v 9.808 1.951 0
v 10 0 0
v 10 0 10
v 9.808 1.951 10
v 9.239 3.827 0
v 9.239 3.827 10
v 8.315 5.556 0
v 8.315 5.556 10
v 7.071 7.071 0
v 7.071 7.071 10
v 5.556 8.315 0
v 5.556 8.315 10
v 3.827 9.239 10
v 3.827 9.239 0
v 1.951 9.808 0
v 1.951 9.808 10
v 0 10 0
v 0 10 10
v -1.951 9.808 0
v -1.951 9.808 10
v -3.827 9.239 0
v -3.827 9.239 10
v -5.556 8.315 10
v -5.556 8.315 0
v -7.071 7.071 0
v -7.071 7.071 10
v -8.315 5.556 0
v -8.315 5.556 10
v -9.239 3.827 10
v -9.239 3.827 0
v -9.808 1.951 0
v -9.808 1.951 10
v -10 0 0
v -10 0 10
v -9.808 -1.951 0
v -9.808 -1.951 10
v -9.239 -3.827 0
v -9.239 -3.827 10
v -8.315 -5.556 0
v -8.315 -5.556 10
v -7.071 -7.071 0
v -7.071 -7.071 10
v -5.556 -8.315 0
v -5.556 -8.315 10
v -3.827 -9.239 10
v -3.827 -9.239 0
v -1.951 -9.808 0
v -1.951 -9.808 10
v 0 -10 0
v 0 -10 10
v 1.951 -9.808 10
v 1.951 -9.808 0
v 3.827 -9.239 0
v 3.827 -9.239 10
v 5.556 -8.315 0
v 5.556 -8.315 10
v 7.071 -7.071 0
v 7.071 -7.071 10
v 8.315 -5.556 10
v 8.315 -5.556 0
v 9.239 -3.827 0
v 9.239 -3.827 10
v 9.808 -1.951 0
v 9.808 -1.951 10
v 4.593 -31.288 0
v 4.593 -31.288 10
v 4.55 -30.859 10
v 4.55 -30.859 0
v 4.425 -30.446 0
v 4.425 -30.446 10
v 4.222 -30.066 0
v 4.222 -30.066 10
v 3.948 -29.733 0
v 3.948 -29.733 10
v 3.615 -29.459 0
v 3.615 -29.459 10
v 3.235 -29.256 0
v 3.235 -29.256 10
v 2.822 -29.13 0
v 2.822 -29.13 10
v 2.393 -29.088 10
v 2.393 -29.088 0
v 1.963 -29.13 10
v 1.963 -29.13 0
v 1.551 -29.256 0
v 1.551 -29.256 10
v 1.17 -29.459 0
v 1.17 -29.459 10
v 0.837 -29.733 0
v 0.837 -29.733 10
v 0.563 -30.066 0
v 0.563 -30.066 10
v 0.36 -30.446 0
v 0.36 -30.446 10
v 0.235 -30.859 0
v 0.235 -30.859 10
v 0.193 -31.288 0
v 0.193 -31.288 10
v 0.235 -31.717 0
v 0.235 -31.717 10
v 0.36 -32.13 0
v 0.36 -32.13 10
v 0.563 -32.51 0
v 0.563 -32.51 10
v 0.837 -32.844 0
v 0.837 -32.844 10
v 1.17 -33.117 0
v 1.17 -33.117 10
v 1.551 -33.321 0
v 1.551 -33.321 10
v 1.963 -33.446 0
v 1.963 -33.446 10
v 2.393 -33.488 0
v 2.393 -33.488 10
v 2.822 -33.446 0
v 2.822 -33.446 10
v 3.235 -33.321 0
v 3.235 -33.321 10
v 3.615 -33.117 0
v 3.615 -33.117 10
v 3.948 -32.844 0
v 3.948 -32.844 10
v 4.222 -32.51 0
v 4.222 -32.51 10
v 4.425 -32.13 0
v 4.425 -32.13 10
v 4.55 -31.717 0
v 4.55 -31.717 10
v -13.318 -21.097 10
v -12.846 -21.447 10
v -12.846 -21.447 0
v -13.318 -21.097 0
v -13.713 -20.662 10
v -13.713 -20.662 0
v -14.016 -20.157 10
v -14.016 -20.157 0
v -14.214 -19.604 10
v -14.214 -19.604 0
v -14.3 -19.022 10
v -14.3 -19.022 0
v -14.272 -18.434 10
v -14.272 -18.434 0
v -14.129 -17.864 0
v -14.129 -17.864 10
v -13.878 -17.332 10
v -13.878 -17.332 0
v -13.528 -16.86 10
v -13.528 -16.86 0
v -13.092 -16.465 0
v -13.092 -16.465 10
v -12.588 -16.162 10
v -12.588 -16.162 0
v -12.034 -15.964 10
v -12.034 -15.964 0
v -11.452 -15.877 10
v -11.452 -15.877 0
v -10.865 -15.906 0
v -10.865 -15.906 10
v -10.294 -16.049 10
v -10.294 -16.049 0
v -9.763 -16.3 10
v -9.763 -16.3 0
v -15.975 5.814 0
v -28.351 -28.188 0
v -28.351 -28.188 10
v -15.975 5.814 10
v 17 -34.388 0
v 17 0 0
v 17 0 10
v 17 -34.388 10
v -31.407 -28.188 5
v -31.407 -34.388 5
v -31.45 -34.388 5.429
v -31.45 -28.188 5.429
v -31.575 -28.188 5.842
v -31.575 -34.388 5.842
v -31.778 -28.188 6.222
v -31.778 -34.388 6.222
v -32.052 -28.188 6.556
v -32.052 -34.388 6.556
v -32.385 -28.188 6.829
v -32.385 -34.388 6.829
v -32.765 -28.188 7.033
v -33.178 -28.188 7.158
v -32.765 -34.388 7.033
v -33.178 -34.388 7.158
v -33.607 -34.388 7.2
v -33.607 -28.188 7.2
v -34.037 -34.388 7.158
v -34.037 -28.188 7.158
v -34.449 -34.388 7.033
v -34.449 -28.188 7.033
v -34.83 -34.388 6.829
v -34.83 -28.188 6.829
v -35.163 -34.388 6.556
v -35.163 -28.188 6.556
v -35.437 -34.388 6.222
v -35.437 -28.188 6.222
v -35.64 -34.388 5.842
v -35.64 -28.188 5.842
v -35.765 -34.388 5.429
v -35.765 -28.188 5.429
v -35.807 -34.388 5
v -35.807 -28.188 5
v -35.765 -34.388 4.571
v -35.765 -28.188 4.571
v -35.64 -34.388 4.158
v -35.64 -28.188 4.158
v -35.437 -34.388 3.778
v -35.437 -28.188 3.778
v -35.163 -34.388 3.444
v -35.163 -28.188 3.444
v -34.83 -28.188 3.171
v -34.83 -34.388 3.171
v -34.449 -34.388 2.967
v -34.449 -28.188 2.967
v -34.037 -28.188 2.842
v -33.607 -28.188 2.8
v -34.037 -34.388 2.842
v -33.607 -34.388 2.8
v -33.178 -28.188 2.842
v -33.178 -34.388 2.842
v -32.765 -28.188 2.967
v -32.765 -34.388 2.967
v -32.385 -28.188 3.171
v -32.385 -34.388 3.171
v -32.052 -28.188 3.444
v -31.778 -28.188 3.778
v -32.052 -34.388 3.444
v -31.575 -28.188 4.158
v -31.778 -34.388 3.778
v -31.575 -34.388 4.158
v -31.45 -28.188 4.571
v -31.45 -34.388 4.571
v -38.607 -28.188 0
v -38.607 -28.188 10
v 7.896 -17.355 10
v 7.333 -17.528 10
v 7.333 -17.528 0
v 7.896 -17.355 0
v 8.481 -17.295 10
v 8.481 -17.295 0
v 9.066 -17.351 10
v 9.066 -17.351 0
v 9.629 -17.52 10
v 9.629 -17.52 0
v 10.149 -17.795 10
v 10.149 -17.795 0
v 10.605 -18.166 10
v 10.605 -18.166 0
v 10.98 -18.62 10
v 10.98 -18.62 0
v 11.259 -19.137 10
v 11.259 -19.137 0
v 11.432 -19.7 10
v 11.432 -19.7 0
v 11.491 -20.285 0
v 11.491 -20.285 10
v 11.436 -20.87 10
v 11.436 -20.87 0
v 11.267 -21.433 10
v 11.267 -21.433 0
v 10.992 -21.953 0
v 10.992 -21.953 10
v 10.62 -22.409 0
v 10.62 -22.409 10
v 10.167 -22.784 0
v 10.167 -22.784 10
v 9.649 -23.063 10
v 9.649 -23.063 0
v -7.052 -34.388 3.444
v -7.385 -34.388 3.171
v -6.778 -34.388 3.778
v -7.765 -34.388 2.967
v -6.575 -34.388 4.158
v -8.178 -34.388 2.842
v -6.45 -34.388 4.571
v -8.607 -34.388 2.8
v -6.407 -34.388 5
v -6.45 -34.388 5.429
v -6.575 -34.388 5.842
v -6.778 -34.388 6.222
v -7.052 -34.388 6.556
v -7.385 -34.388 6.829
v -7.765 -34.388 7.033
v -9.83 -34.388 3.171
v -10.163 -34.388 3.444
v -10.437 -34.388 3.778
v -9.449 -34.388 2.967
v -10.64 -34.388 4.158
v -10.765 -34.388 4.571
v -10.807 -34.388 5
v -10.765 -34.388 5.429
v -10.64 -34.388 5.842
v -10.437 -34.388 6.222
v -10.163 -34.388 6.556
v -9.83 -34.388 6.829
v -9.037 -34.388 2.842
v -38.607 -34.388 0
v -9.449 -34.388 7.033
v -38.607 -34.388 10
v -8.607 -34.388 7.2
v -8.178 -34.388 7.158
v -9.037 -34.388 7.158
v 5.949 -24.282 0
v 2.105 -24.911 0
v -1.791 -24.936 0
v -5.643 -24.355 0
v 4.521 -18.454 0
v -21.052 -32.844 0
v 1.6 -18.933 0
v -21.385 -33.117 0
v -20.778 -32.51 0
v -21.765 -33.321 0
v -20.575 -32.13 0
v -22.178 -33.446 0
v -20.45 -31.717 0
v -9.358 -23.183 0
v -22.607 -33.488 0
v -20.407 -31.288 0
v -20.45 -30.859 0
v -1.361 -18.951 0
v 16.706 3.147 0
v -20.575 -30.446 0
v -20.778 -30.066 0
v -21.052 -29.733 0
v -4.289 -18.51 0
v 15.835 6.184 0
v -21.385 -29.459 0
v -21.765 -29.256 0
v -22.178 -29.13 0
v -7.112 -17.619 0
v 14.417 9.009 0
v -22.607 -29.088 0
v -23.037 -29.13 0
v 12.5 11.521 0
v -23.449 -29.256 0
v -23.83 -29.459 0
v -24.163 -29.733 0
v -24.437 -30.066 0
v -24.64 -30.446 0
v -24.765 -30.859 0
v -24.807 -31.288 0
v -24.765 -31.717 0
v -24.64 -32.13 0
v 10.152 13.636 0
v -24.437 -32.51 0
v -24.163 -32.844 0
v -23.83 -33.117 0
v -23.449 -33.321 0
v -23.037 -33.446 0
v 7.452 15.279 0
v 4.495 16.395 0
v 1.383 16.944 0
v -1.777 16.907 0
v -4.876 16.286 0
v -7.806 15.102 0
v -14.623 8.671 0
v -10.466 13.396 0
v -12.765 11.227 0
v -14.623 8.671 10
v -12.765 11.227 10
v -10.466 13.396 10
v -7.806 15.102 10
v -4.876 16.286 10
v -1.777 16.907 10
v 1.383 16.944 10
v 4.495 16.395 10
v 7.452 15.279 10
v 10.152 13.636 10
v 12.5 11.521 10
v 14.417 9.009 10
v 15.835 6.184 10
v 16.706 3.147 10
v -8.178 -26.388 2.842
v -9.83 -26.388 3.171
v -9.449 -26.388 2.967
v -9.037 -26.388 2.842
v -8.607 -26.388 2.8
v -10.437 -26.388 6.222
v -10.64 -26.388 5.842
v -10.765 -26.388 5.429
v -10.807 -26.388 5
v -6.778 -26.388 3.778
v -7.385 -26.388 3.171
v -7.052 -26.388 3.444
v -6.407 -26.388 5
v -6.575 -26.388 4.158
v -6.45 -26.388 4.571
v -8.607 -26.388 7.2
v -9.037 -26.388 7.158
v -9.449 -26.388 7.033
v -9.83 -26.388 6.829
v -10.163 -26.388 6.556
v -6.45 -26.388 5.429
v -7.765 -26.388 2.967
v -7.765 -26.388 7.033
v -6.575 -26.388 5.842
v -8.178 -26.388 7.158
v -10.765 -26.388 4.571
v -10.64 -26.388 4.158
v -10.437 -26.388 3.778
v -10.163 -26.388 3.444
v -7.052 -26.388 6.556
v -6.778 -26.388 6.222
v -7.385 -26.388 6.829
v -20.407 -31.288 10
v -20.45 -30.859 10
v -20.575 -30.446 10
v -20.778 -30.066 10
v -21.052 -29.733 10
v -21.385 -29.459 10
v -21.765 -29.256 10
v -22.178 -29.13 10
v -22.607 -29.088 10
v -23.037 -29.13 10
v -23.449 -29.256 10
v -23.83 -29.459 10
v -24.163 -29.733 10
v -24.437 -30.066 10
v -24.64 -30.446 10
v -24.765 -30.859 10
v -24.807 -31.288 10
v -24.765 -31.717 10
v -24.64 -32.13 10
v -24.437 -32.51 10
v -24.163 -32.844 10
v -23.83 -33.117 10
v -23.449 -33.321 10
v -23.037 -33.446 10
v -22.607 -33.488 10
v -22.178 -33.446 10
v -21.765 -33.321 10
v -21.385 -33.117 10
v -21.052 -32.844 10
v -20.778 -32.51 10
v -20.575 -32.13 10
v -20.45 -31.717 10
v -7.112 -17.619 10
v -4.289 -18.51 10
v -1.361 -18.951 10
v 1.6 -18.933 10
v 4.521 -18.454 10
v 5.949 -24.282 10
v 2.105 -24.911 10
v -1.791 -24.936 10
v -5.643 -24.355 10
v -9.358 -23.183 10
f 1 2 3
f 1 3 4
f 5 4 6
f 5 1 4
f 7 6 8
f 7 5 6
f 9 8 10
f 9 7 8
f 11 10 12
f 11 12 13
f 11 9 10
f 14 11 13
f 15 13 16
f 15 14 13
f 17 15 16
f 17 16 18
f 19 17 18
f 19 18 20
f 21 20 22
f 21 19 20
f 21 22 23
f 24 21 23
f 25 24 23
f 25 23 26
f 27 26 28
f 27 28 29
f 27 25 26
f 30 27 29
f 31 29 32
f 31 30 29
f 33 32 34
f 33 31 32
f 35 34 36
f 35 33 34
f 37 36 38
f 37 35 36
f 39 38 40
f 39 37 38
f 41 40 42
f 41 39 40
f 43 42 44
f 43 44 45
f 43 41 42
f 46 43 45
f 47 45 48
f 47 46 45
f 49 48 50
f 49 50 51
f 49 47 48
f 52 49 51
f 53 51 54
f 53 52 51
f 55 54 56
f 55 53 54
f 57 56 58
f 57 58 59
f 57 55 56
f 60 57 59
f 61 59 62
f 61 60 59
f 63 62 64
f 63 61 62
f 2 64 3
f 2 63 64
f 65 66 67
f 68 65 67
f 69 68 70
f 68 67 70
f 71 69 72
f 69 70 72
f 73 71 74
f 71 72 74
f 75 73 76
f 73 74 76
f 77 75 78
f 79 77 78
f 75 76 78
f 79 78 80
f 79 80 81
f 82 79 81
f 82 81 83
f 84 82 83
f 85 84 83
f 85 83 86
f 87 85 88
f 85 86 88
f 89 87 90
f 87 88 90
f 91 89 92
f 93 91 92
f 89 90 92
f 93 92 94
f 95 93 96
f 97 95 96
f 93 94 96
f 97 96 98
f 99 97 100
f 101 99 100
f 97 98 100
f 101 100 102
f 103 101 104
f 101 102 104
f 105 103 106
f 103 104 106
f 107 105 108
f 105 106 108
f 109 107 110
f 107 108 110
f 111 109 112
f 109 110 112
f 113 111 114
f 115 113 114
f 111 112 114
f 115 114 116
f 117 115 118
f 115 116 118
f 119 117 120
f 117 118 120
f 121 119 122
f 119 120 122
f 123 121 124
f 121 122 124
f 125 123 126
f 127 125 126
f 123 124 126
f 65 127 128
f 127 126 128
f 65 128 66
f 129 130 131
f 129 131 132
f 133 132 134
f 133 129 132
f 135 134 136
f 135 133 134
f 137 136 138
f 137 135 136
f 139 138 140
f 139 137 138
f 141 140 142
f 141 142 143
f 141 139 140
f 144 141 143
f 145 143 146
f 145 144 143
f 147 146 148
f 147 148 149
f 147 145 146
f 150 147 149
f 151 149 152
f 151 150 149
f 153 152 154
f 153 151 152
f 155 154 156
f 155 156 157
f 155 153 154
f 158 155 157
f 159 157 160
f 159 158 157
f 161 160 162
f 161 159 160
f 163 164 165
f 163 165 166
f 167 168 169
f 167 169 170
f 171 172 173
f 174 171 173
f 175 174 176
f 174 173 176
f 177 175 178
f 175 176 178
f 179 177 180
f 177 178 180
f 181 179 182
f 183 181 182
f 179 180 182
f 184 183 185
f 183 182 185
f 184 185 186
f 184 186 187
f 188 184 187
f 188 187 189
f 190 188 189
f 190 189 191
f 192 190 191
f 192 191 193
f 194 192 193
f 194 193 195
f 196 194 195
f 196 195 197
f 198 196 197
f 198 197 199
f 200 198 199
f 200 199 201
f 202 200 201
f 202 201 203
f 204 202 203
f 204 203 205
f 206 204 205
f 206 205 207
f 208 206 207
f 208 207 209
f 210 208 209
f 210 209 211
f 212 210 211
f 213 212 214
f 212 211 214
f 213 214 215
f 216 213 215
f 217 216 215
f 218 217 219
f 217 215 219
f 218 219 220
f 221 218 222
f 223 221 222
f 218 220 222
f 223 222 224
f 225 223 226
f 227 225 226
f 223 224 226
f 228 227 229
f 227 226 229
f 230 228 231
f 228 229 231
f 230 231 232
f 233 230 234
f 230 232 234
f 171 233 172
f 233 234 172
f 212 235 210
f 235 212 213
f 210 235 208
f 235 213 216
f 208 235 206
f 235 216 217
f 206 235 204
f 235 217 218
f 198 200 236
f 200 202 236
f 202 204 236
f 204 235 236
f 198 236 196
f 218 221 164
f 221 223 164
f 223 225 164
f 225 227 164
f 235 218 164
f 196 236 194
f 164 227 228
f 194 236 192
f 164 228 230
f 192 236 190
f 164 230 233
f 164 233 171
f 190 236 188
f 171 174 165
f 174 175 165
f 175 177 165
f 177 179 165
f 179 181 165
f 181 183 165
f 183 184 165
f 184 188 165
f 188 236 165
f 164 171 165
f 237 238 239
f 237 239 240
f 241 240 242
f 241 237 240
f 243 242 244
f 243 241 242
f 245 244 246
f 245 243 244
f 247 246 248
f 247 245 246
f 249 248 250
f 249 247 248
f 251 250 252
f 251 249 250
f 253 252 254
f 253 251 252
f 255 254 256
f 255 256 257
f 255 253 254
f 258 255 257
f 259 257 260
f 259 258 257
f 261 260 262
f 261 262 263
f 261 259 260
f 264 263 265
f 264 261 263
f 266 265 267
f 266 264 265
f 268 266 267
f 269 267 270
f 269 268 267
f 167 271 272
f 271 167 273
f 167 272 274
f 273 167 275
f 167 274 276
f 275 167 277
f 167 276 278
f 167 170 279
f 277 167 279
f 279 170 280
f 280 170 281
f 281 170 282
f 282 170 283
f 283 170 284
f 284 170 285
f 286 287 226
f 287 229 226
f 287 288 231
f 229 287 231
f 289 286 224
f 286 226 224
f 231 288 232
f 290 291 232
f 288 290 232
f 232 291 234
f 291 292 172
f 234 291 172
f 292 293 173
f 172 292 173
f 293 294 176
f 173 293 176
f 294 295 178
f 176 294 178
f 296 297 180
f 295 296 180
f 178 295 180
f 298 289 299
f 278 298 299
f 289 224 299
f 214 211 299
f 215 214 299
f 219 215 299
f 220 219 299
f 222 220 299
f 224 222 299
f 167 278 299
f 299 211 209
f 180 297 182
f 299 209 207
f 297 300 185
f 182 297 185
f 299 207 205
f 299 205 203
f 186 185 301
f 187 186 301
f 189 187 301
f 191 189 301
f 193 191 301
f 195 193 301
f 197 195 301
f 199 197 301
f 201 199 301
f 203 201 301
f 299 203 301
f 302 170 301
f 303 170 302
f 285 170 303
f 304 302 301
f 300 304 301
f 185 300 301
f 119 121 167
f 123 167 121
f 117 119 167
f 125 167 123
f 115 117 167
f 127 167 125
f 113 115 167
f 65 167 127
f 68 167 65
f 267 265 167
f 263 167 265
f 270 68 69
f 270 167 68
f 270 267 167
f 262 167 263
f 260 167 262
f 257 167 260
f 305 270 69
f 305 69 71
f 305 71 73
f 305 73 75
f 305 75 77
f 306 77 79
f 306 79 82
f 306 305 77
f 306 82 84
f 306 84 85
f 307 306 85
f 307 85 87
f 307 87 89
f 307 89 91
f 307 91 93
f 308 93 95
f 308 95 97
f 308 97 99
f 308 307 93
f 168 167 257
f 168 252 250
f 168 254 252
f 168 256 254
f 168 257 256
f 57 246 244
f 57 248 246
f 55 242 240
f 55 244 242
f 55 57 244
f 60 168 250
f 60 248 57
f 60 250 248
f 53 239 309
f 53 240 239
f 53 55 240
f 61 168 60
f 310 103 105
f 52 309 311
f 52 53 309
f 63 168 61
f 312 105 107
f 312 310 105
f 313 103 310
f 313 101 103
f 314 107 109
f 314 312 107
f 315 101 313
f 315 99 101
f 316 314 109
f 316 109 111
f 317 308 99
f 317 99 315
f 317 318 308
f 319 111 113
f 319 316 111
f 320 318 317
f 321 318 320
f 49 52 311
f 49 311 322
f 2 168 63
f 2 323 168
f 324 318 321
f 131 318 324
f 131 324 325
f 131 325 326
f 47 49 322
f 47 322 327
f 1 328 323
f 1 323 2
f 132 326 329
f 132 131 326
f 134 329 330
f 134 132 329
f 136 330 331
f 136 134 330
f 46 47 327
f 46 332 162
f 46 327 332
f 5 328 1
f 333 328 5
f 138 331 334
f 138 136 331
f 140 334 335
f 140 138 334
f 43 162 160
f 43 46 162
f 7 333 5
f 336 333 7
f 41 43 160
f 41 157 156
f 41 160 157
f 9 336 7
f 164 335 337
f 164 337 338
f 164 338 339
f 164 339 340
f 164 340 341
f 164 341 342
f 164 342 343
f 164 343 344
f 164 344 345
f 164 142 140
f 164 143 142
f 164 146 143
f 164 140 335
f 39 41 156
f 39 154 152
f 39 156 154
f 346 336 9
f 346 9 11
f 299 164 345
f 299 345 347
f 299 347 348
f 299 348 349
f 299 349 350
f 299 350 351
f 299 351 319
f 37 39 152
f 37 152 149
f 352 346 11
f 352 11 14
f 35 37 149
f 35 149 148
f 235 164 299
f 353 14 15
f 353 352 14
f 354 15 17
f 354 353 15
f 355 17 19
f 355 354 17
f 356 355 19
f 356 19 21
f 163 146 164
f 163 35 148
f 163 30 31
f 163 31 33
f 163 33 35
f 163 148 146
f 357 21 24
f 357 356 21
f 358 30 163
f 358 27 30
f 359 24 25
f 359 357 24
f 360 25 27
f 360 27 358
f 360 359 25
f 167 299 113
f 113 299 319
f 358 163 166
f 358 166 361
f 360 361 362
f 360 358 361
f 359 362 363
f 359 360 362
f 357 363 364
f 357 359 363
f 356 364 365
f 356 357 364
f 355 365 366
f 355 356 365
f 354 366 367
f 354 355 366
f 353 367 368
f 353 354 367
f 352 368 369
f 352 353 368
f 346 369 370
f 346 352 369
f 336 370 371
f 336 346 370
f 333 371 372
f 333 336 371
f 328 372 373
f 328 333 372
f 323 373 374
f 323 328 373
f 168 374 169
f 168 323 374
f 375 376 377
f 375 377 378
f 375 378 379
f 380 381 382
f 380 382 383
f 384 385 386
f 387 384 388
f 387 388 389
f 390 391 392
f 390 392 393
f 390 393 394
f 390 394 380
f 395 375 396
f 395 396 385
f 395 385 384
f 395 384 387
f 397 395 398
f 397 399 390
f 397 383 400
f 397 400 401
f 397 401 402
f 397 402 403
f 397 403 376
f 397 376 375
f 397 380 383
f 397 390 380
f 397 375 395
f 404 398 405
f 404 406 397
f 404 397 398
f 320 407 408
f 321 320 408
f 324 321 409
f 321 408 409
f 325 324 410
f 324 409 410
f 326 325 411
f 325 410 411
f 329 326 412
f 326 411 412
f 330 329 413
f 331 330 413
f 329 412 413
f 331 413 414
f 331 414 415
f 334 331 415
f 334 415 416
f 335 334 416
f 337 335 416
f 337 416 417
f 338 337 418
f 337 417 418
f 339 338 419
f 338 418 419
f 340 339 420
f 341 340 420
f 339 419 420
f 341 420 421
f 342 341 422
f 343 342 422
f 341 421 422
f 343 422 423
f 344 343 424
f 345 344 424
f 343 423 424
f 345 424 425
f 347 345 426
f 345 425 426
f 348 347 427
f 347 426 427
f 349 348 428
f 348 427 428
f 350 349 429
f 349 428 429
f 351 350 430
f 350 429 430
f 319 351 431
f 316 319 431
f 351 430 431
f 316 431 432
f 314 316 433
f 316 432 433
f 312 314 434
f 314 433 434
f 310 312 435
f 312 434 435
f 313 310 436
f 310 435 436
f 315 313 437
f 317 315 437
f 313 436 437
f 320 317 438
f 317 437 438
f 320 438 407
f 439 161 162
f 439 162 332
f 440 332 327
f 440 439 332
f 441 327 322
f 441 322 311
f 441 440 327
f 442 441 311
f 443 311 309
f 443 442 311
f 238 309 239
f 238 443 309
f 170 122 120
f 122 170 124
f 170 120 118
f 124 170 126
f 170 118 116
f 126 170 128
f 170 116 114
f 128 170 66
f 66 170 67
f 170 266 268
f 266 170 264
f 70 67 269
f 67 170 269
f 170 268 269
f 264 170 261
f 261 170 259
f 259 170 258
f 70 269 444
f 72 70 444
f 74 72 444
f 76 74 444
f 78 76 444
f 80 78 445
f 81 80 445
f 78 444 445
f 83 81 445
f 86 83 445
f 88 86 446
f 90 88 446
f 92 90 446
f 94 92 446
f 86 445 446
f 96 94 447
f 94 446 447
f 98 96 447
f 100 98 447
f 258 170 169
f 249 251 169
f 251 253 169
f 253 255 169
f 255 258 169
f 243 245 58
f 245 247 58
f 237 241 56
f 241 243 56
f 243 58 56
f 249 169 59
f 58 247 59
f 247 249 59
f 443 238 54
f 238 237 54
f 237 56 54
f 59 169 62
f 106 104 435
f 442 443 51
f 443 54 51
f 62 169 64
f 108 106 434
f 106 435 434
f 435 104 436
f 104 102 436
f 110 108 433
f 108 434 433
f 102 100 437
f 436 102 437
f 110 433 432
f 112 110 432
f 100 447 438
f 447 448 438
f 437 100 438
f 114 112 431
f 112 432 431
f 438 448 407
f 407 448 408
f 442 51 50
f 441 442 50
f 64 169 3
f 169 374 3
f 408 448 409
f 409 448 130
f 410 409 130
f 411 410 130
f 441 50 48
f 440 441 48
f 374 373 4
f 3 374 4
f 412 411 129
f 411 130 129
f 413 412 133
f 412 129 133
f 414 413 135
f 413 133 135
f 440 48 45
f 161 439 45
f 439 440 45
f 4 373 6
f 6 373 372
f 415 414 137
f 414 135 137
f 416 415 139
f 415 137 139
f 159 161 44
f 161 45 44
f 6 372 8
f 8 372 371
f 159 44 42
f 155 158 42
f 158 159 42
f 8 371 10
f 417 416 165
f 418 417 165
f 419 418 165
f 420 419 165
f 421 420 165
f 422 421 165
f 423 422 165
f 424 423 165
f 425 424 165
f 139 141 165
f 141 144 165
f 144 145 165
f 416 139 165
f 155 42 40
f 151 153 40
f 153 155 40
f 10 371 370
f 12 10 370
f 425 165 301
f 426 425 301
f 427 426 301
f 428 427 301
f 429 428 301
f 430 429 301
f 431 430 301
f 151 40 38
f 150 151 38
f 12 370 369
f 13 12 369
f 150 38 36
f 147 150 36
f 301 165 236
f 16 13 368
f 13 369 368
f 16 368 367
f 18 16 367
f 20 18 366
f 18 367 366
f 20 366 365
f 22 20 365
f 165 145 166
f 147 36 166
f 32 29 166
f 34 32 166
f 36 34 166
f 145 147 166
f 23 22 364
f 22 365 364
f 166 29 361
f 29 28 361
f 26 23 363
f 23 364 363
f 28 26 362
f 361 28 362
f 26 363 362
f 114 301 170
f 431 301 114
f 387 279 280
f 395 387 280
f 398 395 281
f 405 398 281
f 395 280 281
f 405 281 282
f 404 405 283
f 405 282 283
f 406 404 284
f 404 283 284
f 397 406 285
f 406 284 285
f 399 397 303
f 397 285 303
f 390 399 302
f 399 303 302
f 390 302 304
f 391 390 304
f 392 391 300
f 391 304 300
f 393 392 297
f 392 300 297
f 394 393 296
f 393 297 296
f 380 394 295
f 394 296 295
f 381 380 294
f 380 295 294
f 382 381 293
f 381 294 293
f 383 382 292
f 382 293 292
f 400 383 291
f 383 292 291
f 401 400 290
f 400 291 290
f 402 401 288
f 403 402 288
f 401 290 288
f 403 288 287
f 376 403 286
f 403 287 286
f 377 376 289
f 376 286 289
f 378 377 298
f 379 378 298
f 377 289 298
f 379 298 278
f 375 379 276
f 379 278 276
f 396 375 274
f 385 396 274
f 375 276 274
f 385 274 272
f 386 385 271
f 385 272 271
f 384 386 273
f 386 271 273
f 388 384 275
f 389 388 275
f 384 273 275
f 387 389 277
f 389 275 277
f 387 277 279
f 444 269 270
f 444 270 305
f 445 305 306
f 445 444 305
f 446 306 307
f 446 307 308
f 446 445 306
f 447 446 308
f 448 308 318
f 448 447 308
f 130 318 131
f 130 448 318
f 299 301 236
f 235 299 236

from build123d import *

# Parameters (mm, degrees)
SKETCH1_R           = 10
EXTRUDE_3_8_DEPTH   = 10
CUT_EXTRUDE2_DEPTH  = 10
BOSS_EXTRUDE2_DEPTH = 10
SKETCH5_R           = 2.2
M5_DRILL_DEPTH      = 8
SKETCH7_R           = 2.2
M4_THROUGH2_DEPTH   = 10


with BuildPart() as part:
    # Sketch1 → 3/8 (new body)
    with BuildSketch(Plane.XY):
        with BuildLine():
            Line((17, 0), (17, -34.388204953))
            Line((17, -34.388204953), (-30.607305145, -34.388204953))
            Line((-30.607305145, -34.388204953), (-15.974774553, 5.814342437))
            ThreePointArc((-15.974774553, 5.814342437), (2.95201902, 16.741731801), (17, 0))
        make_face()
        Circle(SKETCH1_R, mode=Mode.SUBTRACT)
    extrude(amount=EXTRUDE_3_8_DEPTH)

    # Sketch4 → Cut-Extrude2 (cut)
    with BuildSketch(Plane.XY.offset(10)):
        with BuildLine():
            ThreePointArc((-9.762664623, -16.30001164), (-1.360957212, -18.951195093), (7.333365278, -17.527742402))
            ThreePointArc((7.333365278, -17.527742402), (11.258803332, -19.137380895), (9.649164839, -23.06281895))
            ThreePointArc((9.649164839, -23.06281895), (-1.790733174, -24.935783018), (-12.845611346, -21.447383737))
            ThreePointArc((-12.845611346, -21.447383737), (-13.877824033, -17.332224327), (-9.762664623, -16.30001164))
        make_face()
    extrude(amount=-CUT_EXTRUDE2_DEPTH, mode=Mode.SUBTRACT)

    # Sketch6 → Boss-Extrude2 (add)
    with BuildSketch(Plane.XY.offset(10)):
        Polygon((-30.607305145, -34.388204953), (-38.607305145, -34.388204953), (-38.607305145, -28.188204953), (-28.350689692, -28.188204953), align=None)
    extrude(amount=-BOSS_EXTRUDE2_DEPTH)

    # Sketch5 → M5_DRILL (cut)
    with BuildSketch(Plane.XZ.offset(34.388204953)):
        with Locations((-33.607305145, 5)):
            Circle(SKETCH5_R)
        with Locations((-8.607305145, 5)):
            Circle(SKETCH5_R)
    extrude(amount=-M5_DRILL_DEPTH, mode=Mode.SUBTRACT)

    # Sketch7 → M4_through2 (cut)
    with BuildSketch(Plane.XY.offset(10)):
        with Locations((-22.607305145, -31.288204953)):
            Circle(SKETCH7_R)
        with Locations((2.392694855, -31.288204953)):
            Circle(SKETCH7_R)
    extrude(amount=-M4_THROUGH2_DEPTH, mode=Mode.SUBTRACT)


solid = part.part
